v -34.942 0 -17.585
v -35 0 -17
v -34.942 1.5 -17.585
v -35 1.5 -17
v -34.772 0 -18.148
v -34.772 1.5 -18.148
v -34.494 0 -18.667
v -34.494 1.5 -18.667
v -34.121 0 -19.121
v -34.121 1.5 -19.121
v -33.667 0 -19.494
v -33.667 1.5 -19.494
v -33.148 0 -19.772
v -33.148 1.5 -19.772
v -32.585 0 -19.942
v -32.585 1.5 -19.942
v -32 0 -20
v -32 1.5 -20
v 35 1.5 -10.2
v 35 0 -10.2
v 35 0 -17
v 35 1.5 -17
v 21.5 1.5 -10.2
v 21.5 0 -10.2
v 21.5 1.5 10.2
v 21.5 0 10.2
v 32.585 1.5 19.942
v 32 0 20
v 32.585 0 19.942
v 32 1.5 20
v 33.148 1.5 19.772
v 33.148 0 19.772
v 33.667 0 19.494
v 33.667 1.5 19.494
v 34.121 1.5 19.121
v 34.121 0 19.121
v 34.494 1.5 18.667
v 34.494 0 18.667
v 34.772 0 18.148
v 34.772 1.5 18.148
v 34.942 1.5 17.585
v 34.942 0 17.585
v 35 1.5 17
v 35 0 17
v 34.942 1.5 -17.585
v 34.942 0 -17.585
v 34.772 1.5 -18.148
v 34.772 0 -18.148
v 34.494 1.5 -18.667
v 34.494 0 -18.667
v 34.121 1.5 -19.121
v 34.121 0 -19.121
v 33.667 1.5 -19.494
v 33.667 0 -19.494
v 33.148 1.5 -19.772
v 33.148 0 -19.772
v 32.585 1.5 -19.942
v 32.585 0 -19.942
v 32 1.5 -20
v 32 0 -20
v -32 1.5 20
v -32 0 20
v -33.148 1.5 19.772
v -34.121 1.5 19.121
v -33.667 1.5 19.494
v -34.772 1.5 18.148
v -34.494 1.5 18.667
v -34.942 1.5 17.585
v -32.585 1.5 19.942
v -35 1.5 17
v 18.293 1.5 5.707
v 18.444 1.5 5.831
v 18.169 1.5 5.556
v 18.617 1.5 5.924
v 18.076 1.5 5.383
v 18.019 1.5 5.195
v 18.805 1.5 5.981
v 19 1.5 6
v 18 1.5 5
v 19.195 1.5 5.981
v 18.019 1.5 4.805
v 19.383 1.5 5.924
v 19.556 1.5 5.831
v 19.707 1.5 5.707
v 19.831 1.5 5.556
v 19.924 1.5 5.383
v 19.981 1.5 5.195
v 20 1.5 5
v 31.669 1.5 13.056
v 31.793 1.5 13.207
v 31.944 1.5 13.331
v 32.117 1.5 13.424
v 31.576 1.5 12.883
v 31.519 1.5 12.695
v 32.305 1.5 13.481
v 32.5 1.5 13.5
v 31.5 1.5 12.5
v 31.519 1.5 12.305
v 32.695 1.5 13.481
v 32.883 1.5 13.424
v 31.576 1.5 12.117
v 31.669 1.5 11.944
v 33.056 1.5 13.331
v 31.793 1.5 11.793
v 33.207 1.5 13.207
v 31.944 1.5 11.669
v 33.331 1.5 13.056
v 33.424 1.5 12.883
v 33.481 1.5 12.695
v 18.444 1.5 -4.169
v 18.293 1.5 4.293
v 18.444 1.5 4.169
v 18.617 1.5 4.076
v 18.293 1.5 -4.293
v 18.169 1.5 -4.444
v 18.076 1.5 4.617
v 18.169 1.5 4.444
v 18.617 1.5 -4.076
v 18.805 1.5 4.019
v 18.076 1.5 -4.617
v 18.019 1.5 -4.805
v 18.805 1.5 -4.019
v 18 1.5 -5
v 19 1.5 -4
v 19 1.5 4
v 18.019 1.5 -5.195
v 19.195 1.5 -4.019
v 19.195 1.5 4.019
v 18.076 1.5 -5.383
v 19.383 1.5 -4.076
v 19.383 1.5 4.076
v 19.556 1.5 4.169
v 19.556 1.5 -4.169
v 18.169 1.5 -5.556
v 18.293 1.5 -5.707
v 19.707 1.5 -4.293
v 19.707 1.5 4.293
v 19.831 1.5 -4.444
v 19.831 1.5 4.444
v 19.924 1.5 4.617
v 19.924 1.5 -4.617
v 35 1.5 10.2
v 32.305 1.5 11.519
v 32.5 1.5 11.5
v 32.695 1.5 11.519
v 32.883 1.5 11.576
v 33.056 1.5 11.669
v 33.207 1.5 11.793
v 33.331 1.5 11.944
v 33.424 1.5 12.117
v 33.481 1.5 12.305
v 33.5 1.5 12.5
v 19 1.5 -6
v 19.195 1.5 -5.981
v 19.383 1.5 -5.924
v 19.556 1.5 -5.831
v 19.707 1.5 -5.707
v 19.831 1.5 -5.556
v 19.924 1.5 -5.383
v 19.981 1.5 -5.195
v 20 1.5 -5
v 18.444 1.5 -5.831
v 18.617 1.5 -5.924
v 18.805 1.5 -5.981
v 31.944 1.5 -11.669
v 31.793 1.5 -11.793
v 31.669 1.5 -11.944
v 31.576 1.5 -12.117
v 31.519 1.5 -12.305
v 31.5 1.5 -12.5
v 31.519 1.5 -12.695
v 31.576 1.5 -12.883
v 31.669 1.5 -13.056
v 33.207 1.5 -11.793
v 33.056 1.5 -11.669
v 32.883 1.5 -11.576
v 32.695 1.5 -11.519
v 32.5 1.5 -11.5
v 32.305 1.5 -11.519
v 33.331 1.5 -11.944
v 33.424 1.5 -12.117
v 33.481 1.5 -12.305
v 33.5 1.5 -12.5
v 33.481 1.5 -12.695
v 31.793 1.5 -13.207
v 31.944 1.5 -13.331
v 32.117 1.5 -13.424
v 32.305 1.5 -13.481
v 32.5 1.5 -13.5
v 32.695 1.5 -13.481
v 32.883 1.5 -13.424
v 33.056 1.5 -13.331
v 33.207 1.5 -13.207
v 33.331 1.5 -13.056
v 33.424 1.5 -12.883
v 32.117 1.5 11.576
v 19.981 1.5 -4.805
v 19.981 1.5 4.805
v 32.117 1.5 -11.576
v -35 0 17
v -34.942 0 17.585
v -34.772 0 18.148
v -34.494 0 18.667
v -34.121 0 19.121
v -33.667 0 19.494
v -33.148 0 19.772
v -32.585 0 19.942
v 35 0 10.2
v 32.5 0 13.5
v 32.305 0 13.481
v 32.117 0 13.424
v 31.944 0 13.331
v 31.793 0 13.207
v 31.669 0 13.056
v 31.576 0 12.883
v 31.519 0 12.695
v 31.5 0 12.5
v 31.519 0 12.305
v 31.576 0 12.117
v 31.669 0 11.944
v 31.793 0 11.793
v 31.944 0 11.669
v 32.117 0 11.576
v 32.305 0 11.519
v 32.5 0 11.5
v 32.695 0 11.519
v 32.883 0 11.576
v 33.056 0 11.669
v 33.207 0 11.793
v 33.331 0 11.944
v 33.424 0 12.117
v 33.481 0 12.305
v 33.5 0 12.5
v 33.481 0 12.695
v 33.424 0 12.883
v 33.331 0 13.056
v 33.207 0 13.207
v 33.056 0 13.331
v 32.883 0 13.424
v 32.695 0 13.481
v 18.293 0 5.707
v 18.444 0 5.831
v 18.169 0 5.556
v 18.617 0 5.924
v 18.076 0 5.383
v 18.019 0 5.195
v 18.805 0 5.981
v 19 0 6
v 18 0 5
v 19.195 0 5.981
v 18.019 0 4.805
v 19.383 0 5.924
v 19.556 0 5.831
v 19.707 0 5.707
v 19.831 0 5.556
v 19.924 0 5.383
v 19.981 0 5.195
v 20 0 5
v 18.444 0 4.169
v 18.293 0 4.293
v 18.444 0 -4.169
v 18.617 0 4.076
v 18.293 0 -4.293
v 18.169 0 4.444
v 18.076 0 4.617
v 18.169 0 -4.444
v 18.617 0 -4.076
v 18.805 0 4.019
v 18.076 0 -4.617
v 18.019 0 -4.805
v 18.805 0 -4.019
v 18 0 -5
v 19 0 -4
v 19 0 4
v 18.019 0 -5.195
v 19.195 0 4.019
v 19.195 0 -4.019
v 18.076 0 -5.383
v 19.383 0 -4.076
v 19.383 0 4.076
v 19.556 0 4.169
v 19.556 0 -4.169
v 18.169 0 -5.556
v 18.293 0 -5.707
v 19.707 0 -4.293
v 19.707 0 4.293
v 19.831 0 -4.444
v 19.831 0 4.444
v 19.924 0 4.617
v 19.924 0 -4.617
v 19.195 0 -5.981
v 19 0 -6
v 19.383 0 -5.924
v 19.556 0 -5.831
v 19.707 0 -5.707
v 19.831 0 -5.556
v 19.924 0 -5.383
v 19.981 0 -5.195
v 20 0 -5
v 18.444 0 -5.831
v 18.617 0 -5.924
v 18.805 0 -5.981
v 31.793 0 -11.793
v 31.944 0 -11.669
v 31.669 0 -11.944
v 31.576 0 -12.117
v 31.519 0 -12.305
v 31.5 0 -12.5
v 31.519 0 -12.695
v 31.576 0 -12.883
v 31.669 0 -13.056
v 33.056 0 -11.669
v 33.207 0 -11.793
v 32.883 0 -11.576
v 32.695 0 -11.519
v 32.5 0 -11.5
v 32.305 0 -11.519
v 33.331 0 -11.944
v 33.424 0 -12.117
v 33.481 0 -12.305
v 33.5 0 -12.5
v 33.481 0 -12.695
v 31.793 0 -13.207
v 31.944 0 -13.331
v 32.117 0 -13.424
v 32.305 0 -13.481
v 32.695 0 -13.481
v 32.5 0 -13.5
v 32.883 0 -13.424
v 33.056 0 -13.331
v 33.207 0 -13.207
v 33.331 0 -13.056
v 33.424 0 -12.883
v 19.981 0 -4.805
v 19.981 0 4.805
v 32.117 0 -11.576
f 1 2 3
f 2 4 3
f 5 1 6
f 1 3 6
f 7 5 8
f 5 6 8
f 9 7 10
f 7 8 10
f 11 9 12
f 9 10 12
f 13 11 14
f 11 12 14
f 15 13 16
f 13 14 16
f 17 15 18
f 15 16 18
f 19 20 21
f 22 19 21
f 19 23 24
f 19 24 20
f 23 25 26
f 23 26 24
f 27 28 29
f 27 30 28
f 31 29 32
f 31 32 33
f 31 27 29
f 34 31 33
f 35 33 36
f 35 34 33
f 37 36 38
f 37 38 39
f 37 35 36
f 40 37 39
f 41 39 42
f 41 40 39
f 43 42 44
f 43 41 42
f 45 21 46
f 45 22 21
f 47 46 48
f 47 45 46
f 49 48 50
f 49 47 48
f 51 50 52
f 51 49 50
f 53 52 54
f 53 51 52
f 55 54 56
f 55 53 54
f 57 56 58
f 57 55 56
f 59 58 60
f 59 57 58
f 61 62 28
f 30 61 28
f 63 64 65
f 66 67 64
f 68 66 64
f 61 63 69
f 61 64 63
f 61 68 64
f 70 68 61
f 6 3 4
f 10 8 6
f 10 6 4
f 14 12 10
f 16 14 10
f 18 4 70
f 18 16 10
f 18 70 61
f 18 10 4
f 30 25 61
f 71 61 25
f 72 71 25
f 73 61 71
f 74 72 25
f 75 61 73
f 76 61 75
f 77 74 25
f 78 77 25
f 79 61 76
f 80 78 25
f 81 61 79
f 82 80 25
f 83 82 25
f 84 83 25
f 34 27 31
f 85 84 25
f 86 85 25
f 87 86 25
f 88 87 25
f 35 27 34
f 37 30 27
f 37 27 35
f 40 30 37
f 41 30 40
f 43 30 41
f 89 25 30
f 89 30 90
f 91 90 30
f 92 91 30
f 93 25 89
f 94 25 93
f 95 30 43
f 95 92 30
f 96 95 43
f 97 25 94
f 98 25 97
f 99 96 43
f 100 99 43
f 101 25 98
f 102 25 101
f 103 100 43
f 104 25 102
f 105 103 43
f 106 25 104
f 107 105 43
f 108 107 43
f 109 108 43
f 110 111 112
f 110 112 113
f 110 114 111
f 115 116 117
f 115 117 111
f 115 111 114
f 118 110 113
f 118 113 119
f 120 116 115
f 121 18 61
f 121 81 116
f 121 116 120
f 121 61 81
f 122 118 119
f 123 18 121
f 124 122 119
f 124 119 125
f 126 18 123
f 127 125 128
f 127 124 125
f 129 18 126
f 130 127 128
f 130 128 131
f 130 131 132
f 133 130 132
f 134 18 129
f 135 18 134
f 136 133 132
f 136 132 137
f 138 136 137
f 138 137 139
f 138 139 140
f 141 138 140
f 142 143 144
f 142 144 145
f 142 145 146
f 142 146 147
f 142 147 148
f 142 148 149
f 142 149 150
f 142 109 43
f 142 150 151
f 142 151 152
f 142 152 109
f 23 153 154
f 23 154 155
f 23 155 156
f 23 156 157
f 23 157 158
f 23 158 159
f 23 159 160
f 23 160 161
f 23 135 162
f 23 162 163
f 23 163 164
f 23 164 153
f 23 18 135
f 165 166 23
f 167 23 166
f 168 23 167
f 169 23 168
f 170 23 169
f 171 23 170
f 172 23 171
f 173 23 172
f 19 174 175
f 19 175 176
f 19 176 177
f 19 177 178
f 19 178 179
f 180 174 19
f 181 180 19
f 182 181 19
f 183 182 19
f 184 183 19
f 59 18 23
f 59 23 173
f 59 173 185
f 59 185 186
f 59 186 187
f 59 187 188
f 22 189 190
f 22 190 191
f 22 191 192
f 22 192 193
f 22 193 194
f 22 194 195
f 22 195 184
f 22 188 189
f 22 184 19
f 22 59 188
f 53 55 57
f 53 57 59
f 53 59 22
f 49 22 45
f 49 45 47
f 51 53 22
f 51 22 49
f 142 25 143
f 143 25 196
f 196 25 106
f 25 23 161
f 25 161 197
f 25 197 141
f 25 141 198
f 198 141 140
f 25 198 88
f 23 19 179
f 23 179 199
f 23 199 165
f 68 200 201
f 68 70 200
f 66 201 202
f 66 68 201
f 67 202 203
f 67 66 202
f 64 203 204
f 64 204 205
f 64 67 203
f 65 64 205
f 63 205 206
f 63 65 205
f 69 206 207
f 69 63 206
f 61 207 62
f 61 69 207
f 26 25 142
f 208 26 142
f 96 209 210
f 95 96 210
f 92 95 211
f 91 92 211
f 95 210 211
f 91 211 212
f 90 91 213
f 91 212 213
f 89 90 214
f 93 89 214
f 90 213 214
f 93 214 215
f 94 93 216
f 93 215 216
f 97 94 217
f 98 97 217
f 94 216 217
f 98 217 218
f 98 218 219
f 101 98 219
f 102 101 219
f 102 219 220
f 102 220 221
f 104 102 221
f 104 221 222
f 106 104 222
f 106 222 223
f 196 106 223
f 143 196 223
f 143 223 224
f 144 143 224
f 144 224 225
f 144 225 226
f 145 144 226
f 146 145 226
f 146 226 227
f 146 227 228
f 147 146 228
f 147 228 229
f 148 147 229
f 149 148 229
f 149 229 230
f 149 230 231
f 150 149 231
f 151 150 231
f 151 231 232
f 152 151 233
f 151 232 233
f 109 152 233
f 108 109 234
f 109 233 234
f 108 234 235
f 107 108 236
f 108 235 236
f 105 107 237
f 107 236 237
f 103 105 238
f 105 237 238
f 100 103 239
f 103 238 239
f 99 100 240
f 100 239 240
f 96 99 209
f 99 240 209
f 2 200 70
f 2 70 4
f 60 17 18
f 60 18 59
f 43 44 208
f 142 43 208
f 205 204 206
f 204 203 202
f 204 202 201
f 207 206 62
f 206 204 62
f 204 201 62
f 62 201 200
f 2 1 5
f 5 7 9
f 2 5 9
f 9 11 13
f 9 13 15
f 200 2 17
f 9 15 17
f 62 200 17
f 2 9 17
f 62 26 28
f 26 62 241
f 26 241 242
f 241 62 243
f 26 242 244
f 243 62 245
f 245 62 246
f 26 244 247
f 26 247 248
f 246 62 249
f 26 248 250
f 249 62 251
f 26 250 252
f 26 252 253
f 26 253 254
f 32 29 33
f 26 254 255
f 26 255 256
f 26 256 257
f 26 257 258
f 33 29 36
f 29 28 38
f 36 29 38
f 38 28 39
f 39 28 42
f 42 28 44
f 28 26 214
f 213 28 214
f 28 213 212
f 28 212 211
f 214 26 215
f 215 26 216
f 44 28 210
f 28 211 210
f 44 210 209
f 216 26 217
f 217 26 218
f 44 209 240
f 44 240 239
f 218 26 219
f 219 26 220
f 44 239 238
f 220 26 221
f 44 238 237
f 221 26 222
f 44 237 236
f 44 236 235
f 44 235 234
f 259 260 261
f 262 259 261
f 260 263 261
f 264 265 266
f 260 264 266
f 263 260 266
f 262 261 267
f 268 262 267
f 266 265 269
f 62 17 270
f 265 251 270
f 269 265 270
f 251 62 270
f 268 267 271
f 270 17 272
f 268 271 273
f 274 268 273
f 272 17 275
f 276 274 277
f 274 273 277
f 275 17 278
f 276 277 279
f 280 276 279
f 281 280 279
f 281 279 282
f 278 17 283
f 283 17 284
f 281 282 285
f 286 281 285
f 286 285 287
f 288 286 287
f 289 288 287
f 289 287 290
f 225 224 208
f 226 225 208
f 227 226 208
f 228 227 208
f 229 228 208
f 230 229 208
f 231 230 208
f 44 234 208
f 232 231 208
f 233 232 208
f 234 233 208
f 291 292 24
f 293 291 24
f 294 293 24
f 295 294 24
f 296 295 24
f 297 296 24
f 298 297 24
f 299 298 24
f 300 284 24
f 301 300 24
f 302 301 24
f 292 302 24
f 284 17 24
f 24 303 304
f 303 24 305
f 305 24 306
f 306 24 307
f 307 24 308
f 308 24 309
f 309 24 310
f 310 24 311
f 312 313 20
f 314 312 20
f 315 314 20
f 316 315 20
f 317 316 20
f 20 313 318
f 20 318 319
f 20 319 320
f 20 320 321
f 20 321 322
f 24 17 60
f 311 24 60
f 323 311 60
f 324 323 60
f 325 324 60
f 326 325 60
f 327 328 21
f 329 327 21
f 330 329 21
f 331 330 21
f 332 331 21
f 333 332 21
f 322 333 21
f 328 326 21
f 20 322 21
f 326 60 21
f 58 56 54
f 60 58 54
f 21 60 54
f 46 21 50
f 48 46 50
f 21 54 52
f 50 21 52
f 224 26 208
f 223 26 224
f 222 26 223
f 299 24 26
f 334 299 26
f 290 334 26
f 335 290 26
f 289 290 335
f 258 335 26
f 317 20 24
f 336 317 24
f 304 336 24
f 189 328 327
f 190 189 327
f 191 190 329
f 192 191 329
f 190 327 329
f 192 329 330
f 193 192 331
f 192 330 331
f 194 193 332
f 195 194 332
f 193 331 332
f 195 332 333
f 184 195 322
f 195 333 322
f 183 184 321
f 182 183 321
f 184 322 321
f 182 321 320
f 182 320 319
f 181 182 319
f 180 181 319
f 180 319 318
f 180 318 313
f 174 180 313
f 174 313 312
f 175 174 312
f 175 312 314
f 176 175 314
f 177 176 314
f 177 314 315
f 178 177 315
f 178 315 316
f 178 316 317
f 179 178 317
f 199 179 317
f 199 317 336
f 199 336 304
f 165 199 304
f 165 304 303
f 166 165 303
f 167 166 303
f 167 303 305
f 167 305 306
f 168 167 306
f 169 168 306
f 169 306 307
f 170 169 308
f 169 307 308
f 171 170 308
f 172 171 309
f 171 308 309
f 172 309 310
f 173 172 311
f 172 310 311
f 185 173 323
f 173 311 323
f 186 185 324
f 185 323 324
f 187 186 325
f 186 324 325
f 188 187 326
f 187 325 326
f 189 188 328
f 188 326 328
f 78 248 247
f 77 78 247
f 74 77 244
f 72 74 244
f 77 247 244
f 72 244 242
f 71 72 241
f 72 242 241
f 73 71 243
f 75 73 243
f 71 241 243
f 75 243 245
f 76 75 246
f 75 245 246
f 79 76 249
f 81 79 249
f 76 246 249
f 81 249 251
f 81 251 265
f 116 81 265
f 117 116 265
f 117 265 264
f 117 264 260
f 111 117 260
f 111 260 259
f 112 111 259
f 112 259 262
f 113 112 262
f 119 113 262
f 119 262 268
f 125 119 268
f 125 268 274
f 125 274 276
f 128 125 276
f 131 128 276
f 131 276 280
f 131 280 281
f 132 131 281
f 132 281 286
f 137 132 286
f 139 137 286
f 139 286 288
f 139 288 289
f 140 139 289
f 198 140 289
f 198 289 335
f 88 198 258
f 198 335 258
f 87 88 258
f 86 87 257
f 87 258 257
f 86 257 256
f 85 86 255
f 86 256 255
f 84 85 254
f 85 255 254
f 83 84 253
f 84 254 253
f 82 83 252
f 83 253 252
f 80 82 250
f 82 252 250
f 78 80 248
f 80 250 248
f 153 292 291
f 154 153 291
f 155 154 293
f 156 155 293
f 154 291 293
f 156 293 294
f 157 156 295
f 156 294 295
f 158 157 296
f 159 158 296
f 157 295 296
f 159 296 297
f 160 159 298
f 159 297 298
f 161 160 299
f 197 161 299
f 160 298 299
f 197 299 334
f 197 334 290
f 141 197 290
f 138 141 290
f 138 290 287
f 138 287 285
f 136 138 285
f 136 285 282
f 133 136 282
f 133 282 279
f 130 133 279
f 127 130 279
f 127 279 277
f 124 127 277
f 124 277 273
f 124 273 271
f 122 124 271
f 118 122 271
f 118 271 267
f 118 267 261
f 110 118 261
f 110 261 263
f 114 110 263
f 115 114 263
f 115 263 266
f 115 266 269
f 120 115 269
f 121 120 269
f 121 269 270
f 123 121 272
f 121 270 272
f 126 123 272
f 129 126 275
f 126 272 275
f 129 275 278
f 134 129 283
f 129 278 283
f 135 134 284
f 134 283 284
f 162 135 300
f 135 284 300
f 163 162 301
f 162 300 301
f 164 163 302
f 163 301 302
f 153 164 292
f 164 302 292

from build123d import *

# Parameters (mm, degrees)
SKETCH_1_W          = 70
SKETCH_1_H          = 40
EXTRUDE_1_DEPTH     = 1.5
FILLET_1_R          = 3
SKETCH_2_W          = 13.5
SKETCH_2_H          = 20.4
CUT_EXTRUDE_1_DEPTH = 41.339186903
SKETCH_3_R          = 1
CUT_EXTRUDE_2_DEPTH = 41.339186903


with BuildPart() as part:
    # Эскиз1 → Бобышка-Вытянуть1 (new body)
    with BuildSketch(Plane(origin=(0, 0, 0), x_dir=(1, 0, 0), z_dir=(0, 1, 0))):
        Rectangle(SKETCH_1_W, SKETCH_1_H)
    extrude(amount=EXTRUDE_1_DEPTH)

    # Скругление1
    fillet_1_edges = [part.edges().sort_by_distance(p)[0] for p in [
        (-35, 0.75, -20),
        (35, 0.75, -20),
        (35, 0.75, 20),
        (-35, 0.75, 20),
    ]]
    fillet(fillet_1_edges, radius=FILLET_1_R)

    # Эскиз2 → Вырез-Вытянуть1 (cut, through all)
    with BuildSketch(Plane(origin=(0, 1.5, 0), x_dir=(1, 0, 0), z_dir=(0, 1, 0))):
        with Locations((28.25, 0)):
            Rectangle(SKETCH_2_W, SKETCH_2_H)
    extrude(amount=-CUT_EXTRUDE_1_DEPTH, mode=Mode.SUBTRACT)

    # Эскиз3 → Вырез-Вытянуть2 (cut, through all)
    with BuildSketch(Plane.XZ):
        with Locations(Location((19, -5, 0), (0, 0, 270))):
            Circle(SKETCH_3_R)
        with Locations(Location((19, 5, 0), (0, 0, 90))):
            Circle(SKETCH_3_R)
        with Locations(Location((32.5, -12.5, 0), (0, 0, 270))):
            Circle(SKETCH_3_R)
        with Locations(Location((32.5, 12.5, 0), (0, 0, 90))):
            Circle(SKETCH_3_R)
    extrude(amount=-CUT_EXTRUDE_2_DEPTH, mode=Mode.SUBTRACT)


solid = part.part
